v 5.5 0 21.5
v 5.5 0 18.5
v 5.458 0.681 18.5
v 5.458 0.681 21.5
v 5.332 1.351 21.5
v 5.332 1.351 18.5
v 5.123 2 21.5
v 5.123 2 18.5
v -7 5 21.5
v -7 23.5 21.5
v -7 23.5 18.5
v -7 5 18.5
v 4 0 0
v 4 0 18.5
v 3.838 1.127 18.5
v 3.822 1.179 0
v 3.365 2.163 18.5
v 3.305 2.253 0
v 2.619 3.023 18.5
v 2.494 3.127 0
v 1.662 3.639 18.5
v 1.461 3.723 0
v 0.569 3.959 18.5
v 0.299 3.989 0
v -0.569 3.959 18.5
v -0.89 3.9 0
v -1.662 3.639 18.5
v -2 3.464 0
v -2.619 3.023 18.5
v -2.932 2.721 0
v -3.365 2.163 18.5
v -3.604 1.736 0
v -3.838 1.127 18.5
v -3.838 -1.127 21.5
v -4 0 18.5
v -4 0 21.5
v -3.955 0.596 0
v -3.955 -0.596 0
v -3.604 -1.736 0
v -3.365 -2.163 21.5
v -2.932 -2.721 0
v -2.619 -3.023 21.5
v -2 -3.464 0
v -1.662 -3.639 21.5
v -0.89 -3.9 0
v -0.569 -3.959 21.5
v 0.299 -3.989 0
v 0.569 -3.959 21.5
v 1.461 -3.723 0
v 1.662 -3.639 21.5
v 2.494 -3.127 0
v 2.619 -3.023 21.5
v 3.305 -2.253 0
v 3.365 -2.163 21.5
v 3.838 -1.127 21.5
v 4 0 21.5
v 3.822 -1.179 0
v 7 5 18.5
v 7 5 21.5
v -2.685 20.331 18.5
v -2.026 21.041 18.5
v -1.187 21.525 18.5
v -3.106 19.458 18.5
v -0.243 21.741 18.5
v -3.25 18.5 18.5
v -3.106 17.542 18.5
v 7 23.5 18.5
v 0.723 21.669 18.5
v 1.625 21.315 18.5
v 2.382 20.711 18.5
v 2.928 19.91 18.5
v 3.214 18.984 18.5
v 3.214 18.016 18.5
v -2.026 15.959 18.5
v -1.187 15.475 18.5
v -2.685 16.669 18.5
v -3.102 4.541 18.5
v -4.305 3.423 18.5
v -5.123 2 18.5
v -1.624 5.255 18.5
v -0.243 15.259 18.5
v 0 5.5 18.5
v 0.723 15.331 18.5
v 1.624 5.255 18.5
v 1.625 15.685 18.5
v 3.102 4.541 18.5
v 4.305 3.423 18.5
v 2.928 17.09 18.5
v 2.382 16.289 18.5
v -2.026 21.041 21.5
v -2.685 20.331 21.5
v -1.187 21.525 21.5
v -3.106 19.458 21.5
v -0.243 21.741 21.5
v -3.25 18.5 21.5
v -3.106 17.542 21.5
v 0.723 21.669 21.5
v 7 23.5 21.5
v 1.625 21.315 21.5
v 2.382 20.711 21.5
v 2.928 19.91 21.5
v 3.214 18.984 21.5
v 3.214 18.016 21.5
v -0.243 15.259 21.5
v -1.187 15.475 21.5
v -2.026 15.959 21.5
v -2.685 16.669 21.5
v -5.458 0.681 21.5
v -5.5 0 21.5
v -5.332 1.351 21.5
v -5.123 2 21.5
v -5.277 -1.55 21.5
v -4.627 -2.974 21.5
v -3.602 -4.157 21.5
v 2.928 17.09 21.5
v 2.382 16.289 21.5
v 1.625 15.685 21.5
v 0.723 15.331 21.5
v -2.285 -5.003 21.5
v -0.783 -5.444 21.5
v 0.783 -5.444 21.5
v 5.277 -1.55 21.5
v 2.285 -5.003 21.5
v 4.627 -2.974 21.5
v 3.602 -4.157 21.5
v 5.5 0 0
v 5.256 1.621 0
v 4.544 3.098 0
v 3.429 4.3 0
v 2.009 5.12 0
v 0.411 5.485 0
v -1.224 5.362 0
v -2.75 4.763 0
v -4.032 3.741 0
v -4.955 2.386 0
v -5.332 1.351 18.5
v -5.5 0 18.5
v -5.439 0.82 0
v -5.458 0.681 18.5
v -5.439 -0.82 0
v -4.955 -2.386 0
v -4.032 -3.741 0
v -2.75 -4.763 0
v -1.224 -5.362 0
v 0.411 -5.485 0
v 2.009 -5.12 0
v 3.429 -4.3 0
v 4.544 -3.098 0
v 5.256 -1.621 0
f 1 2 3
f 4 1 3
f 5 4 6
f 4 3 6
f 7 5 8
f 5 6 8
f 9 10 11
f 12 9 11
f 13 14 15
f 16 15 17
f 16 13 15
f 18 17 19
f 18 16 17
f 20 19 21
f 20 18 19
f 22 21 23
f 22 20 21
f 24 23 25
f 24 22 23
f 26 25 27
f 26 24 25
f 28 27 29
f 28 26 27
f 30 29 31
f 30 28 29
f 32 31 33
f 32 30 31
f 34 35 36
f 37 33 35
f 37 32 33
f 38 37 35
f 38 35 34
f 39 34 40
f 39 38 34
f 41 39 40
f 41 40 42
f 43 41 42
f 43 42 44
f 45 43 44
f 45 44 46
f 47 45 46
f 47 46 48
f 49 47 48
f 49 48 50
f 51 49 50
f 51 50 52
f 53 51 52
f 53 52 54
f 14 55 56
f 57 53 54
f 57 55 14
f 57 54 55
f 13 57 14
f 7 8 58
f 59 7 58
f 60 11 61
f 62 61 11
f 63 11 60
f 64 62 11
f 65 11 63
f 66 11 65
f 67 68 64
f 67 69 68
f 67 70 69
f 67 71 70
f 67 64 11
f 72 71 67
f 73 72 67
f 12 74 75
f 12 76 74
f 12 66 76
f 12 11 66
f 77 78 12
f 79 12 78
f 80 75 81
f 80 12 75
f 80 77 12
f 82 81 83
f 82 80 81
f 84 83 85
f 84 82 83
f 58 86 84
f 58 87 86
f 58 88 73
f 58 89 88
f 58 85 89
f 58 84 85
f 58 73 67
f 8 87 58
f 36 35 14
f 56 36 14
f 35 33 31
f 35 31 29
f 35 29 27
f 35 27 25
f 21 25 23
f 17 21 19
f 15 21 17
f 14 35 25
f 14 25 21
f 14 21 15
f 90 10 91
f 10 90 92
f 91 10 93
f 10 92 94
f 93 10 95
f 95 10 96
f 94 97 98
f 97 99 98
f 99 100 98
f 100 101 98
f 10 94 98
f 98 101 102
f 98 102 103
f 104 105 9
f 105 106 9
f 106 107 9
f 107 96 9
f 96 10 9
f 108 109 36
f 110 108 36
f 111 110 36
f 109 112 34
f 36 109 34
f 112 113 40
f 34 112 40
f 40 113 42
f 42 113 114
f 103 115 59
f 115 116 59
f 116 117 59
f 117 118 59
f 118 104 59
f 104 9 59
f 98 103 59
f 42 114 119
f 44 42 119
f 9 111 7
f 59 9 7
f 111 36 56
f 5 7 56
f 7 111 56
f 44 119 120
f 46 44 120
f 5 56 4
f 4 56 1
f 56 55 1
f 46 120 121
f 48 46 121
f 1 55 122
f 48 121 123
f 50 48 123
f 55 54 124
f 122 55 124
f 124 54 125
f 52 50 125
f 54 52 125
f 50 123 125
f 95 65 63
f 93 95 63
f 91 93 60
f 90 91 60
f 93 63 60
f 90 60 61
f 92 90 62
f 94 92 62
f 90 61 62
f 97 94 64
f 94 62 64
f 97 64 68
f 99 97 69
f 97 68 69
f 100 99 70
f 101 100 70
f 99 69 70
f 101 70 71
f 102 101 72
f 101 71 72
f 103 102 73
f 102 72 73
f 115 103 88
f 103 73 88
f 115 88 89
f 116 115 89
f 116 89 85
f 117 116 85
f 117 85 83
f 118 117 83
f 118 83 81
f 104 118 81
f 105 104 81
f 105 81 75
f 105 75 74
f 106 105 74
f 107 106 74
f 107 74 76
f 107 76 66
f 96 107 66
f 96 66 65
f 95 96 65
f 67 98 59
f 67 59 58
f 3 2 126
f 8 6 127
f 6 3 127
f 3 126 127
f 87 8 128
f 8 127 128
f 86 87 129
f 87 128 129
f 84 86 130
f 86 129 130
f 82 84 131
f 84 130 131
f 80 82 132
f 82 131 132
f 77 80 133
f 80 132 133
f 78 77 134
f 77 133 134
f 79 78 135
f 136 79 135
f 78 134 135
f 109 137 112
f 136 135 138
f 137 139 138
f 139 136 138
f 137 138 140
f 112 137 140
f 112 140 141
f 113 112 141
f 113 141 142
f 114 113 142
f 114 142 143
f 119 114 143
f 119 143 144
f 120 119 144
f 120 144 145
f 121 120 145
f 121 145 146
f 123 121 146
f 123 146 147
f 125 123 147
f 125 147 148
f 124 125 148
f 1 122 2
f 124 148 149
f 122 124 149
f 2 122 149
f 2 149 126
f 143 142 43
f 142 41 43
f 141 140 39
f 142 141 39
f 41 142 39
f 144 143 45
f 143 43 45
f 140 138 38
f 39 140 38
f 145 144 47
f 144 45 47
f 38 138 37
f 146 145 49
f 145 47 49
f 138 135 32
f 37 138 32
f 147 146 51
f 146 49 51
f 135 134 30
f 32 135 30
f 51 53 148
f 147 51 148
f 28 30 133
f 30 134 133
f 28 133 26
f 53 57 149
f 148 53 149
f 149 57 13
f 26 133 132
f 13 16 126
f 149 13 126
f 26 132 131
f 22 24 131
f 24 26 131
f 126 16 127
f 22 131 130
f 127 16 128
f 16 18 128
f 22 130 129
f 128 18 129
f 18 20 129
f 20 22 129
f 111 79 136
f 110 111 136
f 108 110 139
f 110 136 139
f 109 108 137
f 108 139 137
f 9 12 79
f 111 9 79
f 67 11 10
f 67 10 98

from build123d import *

# Parameters (mm, degrees)
SKETCH_1_R          = 5.5
SKETCH_1_R_2        = 4
EXTRUDE_1_DEPTH     = 21.5
SKETCH_2_W          = 14
SKETCH_2_H          = 3
EXTRUDE_2_DEPTH     = 23.5
SKETCH_3_R          = 3.25
CUT_EXTRUDE_1_DEPTH = 10


with BuildPart() as part:
    # 草图1 → 凸台-拉伸1 (new body)
    with BuildSketch(Plane.XY):
        Circle(SKETCH_1_R)
        Circle(SKETCH_1_R_2, mode=Mode.SUBTRACT)
    extrude(amount=EXTRUDE_1_DEPTH)

    # 草图2 → 凸台-拉伸2 (add)
    with BuildSketch(Plane(origin=(0, 0, 0), x_dir=(1, 0, 0), z_dir=(0, 1, 0))):
        with Locations((0, -20)):
            Rectangle(SKETCH_2_W, SKETCH_2_H)
    extrude(amount=EXTRUDE_2_DEPTH)

    # 草图3 → 切除-拉伸1 (cut)
    with BuildSketch(Plane(origin=(0, 0, 18.5), x_dir=(-1, 0, 0), z_dir=(0, 0, -1))):
        with Locations((0, 18.5)):
            Circle(SKETCH_3_R)
        with BuildLine():
            Line((-5.123475383, 2), (-7, 5))
            Line((-7, 5), (-7, 0))
            Line((-7, 0), (-5.5, 0))
            ThreePointArc((-5.5, 0), (-5.405049242, 1.017567048), (-5.123475383, 2))
        make_face()
        with BuildLine():
            Line((7, 5), (5.123475383, 2))
            ThreePointArc((5.123475383, 2), (5.405049242, 1.017567048), (5.5, 0))
            Line((5.5, 0), (7, 0))
            Line((7, 0), (7, 5))
        make_face()
    extrude(amount=-CUT_EXTRUDE_1_DEPTH, mode=Mode.SUBTRACT)


solid = part.part
